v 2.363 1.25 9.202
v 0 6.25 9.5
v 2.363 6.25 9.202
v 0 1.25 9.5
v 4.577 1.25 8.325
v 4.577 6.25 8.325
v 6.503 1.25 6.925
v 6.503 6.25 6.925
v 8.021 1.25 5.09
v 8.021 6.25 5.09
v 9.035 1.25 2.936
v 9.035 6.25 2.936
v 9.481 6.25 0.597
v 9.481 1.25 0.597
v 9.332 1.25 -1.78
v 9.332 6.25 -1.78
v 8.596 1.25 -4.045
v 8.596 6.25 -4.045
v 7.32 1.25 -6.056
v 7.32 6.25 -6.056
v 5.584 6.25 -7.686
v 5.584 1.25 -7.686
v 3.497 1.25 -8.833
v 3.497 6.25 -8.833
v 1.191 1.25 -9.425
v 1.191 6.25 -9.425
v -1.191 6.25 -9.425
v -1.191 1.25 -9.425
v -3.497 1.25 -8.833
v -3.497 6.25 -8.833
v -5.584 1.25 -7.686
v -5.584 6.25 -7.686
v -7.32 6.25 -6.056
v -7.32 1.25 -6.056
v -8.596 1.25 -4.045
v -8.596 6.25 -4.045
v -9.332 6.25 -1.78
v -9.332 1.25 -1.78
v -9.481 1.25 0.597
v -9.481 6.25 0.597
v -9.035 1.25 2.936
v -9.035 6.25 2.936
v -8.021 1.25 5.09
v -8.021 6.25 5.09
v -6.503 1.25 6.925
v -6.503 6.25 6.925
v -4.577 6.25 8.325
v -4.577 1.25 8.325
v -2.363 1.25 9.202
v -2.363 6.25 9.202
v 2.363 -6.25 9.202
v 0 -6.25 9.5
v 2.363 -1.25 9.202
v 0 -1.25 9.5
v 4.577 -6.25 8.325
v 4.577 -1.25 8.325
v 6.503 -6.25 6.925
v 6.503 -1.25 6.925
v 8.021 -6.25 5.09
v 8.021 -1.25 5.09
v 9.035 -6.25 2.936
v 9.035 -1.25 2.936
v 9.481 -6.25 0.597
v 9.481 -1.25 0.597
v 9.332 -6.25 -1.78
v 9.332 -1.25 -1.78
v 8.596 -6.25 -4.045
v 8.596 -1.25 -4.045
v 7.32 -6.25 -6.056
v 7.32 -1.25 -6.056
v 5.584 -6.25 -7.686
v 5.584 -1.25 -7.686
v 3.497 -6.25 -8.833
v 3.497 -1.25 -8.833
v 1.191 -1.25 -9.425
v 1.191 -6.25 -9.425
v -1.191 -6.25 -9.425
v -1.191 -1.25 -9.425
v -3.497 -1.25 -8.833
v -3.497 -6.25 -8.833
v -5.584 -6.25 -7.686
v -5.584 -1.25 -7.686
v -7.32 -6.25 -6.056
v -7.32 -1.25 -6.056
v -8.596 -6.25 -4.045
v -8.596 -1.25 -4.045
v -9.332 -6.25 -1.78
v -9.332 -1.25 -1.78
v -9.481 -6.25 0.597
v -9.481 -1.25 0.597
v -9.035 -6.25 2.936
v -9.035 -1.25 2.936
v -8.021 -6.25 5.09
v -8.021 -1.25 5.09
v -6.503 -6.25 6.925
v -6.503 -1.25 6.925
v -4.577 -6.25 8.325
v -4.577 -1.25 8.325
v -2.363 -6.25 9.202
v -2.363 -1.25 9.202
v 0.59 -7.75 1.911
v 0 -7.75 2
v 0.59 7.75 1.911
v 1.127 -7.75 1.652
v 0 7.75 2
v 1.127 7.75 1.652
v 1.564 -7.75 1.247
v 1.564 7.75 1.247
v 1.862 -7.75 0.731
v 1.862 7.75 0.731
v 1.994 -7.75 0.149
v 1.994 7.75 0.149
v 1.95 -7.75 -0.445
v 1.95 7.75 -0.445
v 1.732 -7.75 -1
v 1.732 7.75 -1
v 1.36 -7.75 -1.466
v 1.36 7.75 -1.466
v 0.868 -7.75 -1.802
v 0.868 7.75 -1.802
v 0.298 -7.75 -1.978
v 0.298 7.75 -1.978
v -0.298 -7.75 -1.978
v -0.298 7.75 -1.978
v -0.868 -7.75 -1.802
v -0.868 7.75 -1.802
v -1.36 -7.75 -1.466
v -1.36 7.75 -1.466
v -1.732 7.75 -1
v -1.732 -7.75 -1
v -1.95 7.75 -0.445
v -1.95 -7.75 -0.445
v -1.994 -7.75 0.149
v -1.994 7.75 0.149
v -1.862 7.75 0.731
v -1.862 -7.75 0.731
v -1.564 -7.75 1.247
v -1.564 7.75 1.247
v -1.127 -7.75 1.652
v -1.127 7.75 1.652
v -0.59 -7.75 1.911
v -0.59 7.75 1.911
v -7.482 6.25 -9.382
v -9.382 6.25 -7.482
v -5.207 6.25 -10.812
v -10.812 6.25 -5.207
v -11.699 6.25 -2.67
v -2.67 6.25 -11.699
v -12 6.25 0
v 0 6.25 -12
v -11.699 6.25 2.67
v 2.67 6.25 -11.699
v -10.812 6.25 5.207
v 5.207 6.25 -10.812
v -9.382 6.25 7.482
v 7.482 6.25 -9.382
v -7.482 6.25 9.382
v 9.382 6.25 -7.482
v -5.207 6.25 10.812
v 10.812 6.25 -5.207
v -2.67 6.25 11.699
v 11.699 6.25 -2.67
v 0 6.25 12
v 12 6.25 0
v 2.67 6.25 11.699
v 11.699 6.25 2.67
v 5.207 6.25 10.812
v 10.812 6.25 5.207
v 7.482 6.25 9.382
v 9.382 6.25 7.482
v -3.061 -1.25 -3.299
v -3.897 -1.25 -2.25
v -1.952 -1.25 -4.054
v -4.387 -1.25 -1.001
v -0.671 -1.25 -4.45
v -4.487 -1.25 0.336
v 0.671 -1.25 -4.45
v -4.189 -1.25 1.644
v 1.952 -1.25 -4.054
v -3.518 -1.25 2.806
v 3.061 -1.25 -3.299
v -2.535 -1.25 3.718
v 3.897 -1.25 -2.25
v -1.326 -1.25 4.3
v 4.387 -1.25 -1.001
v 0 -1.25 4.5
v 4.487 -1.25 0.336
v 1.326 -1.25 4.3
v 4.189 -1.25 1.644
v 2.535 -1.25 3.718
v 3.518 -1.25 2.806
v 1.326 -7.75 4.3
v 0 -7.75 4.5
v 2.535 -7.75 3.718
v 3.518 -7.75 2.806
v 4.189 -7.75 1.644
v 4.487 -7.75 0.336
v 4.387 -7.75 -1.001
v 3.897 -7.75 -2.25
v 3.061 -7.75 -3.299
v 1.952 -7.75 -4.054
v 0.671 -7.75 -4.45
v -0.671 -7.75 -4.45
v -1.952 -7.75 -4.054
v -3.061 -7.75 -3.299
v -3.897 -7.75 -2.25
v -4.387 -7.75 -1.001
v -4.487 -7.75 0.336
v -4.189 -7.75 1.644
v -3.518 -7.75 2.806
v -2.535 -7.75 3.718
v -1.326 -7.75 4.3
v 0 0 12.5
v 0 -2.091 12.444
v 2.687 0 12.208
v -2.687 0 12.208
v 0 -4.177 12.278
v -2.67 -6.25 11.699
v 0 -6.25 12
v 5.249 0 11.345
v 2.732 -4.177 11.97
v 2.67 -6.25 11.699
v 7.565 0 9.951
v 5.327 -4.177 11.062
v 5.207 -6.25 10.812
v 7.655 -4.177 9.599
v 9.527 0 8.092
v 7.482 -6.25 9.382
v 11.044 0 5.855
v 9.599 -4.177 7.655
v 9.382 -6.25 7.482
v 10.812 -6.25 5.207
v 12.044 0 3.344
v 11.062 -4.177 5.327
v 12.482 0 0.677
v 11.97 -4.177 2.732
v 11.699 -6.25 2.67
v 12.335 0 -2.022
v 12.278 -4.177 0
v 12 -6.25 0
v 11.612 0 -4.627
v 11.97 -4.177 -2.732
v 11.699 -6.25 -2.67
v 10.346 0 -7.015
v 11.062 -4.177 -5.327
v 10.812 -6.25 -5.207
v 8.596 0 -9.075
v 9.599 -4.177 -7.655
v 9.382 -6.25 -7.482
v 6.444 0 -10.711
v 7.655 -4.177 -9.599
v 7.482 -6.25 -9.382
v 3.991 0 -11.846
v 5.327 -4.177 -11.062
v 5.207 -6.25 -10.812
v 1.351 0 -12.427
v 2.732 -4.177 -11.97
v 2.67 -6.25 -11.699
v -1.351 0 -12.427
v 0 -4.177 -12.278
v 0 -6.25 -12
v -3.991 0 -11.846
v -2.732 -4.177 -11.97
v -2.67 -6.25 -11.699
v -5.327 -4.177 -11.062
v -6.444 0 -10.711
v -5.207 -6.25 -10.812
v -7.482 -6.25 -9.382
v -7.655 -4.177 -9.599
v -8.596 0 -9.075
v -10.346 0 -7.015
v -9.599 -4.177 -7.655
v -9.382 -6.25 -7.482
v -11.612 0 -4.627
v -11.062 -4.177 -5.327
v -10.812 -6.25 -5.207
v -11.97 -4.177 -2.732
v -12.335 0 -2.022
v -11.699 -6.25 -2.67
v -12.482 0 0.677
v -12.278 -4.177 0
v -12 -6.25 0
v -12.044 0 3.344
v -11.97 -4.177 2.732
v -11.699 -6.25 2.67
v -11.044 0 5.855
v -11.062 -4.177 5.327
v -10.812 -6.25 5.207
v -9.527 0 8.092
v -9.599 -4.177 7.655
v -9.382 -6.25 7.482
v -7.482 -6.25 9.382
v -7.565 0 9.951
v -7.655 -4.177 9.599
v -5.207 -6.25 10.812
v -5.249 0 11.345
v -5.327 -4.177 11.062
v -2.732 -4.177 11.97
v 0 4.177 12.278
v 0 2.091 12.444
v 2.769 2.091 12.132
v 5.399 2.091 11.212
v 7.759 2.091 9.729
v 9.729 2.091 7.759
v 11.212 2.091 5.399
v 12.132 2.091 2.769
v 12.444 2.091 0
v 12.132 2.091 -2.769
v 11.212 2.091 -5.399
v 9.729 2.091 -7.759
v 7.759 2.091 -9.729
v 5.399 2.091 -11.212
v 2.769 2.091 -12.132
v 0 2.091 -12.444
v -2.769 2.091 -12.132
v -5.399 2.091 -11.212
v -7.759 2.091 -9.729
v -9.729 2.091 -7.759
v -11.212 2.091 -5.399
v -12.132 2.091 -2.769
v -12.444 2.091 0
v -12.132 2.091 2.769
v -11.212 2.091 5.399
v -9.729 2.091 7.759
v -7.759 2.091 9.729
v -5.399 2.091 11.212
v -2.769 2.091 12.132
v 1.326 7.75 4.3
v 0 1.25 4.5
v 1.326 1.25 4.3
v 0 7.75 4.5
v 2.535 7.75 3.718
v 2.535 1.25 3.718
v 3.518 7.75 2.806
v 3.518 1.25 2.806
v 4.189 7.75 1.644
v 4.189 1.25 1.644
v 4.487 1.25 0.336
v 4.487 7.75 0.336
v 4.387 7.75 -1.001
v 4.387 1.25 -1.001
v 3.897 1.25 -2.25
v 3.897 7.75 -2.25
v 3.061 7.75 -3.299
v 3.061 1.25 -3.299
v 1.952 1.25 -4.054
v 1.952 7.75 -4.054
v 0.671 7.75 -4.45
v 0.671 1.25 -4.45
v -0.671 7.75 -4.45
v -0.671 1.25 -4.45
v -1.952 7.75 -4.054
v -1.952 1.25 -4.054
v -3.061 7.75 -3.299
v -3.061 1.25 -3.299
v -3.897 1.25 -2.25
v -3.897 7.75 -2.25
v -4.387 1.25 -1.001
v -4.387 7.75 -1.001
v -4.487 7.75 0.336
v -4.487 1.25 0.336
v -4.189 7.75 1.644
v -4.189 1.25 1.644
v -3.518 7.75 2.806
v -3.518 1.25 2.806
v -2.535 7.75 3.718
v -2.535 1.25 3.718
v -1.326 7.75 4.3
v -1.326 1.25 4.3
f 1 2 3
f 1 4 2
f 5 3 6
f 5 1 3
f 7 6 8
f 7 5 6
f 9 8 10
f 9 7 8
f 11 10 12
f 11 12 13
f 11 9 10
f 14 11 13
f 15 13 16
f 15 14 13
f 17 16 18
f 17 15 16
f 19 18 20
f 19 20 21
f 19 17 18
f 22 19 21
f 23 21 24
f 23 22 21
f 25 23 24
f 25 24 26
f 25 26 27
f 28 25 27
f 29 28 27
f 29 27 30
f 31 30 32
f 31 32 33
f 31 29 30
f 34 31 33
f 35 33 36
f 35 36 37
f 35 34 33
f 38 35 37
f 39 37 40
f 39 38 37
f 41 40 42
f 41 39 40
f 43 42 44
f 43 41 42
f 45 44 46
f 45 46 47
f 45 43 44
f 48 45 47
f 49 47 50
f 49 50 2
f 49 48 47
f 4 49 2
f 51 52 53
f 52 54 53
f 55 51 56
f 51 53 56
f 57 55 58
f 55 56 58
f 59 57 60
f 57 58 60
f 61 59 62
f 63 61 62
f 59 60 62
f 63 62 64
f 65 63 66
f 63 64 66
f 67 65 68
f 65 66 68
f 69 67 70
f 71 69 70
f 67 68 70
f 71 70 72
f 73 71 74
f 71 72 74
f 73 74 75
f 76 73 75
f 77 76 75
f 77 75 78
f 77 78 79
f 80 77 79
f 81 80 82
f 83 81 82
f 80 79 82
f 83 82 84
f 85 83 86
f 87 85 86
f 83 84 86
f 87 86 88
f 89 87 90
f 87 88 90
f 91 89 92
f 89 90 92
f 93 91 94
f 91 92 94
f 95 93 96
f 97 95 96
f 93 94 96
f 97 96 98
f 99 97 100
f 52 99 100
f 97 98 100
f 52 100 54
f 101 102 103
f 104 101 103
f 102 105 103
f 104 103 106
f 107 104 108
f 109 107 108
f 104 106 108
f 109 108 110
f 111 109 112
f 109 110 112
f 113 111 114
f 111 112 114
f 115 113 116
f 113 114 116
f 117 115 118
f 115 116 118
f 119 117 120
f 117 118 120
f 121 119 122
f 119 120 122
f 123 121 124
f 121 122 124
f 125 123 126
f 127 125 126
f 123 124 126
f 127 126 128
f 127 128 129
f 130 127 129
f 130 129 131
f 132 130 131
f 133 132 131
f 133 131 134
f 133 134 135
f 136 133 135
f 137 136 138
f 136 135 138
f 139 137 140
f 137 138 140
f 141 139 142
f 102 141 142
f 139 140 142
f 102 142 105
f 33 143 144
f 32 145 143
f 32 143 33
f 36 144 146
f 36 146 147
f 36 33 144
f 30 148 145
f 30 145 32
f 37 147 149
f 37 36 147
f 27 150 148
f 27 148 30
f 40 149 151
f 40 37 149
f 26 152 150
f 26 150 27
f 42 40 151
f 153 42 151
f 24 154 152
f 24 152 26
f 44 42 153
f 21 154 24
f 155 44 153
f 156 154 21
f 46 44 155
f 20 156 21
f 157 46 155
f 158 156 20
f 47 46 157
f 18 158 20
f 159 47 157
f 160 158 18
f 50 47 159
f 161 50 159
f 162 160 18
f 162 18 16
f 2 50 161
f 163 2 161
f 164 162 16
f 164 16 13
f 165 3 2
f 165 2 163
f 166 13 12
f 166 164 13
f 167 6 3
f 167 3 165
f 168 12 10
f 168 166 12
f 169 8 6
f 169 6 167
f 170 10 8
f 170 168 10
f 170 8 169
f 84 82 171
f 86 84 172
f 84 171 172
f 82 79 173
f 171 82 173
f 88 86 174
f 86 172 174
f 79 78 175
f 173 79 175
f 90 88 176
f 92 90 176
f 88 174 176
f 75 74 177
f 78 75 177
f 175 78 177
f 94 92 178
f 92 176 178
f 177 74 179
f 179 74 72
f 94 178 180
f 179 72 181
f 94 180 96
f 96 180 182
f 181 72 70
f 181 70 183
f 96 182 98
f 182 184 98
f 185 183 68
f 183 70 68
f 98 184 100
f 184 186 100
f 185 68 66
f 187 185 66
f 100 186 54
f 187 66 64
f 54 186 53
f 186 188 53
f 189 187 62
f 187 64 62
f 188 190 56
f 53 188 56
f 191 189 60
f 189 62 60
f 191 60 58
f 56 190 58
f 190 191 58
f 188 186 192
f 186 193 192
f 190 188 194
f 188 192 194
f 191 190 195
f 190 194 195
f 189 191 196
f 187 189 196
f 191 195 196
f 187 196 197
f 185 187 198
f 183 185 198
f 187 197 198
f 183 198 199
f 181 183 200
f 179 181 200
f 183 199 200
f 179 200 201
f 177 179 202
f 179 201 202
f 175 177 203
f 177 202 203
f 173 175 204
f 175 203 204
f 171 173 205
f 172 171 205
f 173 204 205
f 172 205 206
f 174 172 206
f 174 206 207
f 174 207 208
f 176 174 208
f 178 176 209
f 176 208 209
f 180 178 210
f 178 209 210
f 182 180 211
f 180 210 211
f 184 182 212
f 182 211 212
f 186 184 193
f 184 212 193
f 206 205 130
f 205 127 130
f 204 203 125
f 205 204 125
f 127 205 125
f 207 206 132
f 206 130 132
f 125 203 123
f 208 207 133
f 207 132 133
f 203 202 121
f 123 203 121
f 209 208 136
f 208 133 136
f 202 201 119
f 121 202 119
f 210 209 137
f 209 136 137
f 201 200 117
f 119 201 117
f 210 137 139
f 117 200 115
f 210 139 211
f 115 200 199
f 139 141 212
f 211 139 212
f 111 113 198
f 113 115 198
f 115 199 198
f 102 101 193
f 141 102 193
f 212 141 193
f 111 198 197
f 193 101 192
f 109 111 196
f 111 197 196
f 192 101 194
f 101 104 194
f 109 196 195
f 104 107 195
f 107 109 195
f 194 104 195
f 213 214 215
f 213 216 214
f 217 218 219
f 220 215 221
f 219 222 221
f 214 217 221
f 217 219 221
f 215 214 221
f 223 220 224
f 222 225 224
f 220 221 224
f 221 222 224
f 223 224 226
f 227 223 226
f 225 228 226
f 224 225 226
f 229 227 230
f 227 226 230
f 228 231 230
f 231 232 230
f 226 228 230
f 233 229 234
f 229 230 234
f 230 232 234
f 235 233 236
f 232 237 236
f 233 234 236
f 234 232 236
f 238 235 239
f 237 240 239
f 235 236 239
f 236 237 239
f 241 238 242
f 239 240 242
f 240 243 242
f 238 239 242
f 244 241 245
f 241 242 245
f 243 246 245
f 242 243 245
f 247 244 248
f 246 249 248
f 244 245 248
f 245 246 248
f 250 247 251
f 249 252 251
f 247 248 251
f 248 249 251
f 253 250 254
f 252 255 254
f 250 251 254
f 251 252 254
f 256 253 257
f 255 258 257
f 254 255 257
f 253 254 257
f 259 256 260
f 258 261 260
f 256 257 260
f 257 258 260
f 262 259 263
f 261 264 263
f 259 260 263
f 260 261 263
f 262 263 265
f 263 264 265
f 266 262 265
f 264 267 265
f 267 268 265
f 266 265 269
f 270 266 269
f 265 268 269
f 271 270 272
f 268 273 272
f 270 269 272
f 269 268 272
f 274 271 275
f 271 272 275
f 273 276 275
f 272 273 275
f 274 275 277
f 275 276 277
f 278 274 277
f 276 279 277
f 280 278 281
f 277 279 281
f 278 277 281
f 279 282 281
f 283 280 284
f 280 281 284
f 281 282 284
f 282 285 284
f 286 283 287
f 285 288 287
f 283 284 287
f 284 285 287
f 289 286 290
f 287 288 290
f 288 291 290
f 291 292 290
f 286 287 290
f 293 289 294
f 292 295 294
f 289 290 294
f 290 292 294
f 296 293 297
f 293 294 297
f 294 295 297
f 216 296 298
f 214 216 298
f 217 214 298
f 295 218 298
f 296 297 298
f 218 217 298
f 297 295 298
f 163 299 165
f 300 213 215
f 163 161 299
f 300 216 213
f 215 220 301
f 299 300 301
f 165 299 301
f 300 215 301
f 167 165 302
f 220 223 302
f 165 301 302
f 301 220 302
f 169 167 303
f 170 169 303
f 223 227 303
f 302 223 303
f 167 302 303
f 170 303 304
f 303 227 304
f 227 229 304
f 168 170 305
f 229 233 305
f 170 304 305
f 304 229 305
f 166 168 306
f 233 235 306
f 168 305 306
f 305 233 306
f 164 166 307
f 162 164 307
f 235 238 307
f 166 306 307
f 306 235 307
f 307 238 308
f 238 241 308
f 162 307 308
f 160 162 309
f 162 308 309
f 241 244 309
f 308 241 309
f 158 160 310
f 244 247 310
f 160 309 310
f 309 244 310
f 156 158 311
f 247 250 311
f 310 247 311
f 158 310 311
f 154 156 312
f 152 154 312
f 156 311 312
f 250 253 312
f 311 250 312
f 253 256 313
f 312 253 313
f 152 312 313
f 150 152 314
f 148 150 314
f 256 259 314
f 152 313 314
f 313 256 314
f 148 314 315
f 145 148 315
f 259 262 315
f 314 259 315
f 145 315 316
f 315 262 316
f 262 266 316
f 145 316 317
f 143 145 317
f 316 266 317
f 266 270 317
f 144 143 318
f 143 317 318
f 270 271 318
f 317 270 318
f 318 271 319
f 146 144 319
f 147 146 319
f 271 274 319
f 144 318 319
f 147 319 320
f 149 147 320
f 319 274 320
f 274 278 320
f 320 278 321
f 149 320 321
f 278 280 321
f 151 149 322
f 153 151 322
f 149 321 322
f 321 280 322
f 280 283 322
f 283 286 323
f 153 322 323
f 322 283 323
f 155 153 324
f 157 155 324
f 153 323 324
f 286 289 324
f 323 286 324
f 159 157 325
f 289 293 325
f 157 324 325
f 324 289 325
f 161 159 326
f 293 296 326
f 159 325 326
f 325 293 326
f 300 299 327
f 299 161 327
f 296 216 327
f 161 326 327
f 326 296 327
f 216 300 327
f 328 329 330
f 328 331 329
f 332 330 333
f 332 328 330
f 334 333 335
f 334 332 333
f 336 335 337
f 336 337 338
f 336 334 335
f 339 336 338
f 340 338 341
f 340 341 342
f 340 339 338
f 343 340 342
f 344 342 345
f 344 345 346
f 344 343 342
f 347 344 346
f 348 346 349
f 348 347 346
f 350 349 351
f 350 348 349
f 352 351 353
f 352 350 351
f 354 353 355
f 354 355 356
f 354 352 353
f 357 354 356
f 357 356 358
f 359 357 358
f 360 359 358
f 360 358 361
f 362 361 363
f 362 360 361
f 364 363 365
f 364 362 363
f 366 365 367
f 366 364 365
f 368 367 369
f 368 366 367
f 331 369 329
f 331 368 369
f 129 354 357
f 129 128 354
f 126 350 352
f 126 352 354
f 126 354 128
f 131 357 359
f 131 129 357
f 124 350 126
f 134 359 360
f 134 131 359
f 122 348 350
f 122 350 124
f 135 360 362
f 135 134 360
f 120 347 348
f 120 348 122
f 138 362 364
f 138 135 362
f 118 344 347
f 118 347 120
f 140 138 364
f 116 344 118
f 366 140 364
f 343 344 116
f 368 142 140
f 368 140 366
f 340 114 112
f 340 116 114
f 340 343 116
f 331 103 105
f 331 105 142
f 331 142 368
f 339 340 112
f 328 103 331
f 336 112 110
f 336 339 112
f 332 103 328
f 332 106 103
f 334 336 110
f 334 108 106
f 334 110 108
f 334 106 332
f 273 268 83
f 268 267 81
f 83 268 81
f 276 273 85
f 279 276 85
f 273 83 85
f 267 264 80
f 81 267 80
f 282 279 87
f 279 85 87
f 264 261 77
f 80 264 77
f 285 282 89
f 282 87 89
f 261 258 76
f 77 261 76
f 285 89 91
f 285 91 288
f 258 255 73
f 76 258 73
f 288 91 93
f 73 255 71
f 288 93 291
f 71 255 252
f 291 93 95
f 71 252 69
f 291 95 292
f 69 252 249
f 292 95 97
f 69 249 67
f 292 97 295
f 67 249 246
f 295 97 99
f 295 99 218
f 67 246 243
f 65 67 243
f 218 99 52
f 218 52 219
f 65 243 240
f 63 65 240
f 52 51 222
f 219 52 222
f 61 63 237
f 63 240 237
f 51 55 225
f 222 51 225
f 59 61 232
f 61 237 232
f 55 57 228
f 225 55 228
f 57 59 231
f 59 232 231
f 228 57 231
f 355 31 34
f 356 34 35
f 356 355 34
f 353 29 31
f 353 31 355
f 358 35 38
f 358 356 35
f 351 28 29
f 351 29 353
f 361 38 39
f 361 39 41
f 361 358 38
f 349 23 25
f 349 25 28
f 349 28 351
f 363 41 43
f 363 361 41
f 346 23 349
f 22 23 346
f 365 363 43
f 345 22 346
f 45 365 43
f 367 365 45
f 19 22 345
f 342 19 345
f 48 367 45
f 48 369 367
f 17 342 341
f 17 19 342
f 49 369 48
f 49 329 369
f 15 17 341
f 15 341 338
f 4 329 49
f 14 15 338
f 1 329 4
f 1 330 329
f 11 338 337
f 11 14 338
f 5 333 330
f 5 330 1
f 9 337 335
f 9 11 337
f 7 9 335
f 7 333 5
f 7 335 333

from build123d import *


with BuildPart() as part:
    # Sketch → Revolution (revolve)
    with BuildSketch(Plane.YZ):
        with BuildLine():
            ThreePointArc((6.25, 12), (3.134984, 12.374801), (0, 12.5))
            ThreePointArc((0, 12.5), (-3.134984, 12.374805), (-6.25, 12.000009))
            Line((-6.25, 12.000009), (-6.25, 9.5))
            Line((-6.25, 9.5), (-1.25, 9.5))
            Line((-1.25, 9.5), (-1.25, 4.5))
            Line((-1.25, 4.5), (-7.75, 4.5))
            Line((-7.75, 4.5), (-7.75, 2))
            Line((0, 2), (-7.75, 2))
            Line((0, 2), (7.75, 2))
            Line((7.75, 4.5), (7.75, 2))
            Line((1.25, 4.5), (7.75, 4.5))
            Line((1.25, 9.5), (1.25, 4.5))
            Line((6.25, 9.5), (1.25, 9.5))
            Line((6.25, 12), (6.25, 9.5))
        make_face()
    revolve(axis=Axis((0, 0, 0), (0, 1, 0)))


solid = part.part
